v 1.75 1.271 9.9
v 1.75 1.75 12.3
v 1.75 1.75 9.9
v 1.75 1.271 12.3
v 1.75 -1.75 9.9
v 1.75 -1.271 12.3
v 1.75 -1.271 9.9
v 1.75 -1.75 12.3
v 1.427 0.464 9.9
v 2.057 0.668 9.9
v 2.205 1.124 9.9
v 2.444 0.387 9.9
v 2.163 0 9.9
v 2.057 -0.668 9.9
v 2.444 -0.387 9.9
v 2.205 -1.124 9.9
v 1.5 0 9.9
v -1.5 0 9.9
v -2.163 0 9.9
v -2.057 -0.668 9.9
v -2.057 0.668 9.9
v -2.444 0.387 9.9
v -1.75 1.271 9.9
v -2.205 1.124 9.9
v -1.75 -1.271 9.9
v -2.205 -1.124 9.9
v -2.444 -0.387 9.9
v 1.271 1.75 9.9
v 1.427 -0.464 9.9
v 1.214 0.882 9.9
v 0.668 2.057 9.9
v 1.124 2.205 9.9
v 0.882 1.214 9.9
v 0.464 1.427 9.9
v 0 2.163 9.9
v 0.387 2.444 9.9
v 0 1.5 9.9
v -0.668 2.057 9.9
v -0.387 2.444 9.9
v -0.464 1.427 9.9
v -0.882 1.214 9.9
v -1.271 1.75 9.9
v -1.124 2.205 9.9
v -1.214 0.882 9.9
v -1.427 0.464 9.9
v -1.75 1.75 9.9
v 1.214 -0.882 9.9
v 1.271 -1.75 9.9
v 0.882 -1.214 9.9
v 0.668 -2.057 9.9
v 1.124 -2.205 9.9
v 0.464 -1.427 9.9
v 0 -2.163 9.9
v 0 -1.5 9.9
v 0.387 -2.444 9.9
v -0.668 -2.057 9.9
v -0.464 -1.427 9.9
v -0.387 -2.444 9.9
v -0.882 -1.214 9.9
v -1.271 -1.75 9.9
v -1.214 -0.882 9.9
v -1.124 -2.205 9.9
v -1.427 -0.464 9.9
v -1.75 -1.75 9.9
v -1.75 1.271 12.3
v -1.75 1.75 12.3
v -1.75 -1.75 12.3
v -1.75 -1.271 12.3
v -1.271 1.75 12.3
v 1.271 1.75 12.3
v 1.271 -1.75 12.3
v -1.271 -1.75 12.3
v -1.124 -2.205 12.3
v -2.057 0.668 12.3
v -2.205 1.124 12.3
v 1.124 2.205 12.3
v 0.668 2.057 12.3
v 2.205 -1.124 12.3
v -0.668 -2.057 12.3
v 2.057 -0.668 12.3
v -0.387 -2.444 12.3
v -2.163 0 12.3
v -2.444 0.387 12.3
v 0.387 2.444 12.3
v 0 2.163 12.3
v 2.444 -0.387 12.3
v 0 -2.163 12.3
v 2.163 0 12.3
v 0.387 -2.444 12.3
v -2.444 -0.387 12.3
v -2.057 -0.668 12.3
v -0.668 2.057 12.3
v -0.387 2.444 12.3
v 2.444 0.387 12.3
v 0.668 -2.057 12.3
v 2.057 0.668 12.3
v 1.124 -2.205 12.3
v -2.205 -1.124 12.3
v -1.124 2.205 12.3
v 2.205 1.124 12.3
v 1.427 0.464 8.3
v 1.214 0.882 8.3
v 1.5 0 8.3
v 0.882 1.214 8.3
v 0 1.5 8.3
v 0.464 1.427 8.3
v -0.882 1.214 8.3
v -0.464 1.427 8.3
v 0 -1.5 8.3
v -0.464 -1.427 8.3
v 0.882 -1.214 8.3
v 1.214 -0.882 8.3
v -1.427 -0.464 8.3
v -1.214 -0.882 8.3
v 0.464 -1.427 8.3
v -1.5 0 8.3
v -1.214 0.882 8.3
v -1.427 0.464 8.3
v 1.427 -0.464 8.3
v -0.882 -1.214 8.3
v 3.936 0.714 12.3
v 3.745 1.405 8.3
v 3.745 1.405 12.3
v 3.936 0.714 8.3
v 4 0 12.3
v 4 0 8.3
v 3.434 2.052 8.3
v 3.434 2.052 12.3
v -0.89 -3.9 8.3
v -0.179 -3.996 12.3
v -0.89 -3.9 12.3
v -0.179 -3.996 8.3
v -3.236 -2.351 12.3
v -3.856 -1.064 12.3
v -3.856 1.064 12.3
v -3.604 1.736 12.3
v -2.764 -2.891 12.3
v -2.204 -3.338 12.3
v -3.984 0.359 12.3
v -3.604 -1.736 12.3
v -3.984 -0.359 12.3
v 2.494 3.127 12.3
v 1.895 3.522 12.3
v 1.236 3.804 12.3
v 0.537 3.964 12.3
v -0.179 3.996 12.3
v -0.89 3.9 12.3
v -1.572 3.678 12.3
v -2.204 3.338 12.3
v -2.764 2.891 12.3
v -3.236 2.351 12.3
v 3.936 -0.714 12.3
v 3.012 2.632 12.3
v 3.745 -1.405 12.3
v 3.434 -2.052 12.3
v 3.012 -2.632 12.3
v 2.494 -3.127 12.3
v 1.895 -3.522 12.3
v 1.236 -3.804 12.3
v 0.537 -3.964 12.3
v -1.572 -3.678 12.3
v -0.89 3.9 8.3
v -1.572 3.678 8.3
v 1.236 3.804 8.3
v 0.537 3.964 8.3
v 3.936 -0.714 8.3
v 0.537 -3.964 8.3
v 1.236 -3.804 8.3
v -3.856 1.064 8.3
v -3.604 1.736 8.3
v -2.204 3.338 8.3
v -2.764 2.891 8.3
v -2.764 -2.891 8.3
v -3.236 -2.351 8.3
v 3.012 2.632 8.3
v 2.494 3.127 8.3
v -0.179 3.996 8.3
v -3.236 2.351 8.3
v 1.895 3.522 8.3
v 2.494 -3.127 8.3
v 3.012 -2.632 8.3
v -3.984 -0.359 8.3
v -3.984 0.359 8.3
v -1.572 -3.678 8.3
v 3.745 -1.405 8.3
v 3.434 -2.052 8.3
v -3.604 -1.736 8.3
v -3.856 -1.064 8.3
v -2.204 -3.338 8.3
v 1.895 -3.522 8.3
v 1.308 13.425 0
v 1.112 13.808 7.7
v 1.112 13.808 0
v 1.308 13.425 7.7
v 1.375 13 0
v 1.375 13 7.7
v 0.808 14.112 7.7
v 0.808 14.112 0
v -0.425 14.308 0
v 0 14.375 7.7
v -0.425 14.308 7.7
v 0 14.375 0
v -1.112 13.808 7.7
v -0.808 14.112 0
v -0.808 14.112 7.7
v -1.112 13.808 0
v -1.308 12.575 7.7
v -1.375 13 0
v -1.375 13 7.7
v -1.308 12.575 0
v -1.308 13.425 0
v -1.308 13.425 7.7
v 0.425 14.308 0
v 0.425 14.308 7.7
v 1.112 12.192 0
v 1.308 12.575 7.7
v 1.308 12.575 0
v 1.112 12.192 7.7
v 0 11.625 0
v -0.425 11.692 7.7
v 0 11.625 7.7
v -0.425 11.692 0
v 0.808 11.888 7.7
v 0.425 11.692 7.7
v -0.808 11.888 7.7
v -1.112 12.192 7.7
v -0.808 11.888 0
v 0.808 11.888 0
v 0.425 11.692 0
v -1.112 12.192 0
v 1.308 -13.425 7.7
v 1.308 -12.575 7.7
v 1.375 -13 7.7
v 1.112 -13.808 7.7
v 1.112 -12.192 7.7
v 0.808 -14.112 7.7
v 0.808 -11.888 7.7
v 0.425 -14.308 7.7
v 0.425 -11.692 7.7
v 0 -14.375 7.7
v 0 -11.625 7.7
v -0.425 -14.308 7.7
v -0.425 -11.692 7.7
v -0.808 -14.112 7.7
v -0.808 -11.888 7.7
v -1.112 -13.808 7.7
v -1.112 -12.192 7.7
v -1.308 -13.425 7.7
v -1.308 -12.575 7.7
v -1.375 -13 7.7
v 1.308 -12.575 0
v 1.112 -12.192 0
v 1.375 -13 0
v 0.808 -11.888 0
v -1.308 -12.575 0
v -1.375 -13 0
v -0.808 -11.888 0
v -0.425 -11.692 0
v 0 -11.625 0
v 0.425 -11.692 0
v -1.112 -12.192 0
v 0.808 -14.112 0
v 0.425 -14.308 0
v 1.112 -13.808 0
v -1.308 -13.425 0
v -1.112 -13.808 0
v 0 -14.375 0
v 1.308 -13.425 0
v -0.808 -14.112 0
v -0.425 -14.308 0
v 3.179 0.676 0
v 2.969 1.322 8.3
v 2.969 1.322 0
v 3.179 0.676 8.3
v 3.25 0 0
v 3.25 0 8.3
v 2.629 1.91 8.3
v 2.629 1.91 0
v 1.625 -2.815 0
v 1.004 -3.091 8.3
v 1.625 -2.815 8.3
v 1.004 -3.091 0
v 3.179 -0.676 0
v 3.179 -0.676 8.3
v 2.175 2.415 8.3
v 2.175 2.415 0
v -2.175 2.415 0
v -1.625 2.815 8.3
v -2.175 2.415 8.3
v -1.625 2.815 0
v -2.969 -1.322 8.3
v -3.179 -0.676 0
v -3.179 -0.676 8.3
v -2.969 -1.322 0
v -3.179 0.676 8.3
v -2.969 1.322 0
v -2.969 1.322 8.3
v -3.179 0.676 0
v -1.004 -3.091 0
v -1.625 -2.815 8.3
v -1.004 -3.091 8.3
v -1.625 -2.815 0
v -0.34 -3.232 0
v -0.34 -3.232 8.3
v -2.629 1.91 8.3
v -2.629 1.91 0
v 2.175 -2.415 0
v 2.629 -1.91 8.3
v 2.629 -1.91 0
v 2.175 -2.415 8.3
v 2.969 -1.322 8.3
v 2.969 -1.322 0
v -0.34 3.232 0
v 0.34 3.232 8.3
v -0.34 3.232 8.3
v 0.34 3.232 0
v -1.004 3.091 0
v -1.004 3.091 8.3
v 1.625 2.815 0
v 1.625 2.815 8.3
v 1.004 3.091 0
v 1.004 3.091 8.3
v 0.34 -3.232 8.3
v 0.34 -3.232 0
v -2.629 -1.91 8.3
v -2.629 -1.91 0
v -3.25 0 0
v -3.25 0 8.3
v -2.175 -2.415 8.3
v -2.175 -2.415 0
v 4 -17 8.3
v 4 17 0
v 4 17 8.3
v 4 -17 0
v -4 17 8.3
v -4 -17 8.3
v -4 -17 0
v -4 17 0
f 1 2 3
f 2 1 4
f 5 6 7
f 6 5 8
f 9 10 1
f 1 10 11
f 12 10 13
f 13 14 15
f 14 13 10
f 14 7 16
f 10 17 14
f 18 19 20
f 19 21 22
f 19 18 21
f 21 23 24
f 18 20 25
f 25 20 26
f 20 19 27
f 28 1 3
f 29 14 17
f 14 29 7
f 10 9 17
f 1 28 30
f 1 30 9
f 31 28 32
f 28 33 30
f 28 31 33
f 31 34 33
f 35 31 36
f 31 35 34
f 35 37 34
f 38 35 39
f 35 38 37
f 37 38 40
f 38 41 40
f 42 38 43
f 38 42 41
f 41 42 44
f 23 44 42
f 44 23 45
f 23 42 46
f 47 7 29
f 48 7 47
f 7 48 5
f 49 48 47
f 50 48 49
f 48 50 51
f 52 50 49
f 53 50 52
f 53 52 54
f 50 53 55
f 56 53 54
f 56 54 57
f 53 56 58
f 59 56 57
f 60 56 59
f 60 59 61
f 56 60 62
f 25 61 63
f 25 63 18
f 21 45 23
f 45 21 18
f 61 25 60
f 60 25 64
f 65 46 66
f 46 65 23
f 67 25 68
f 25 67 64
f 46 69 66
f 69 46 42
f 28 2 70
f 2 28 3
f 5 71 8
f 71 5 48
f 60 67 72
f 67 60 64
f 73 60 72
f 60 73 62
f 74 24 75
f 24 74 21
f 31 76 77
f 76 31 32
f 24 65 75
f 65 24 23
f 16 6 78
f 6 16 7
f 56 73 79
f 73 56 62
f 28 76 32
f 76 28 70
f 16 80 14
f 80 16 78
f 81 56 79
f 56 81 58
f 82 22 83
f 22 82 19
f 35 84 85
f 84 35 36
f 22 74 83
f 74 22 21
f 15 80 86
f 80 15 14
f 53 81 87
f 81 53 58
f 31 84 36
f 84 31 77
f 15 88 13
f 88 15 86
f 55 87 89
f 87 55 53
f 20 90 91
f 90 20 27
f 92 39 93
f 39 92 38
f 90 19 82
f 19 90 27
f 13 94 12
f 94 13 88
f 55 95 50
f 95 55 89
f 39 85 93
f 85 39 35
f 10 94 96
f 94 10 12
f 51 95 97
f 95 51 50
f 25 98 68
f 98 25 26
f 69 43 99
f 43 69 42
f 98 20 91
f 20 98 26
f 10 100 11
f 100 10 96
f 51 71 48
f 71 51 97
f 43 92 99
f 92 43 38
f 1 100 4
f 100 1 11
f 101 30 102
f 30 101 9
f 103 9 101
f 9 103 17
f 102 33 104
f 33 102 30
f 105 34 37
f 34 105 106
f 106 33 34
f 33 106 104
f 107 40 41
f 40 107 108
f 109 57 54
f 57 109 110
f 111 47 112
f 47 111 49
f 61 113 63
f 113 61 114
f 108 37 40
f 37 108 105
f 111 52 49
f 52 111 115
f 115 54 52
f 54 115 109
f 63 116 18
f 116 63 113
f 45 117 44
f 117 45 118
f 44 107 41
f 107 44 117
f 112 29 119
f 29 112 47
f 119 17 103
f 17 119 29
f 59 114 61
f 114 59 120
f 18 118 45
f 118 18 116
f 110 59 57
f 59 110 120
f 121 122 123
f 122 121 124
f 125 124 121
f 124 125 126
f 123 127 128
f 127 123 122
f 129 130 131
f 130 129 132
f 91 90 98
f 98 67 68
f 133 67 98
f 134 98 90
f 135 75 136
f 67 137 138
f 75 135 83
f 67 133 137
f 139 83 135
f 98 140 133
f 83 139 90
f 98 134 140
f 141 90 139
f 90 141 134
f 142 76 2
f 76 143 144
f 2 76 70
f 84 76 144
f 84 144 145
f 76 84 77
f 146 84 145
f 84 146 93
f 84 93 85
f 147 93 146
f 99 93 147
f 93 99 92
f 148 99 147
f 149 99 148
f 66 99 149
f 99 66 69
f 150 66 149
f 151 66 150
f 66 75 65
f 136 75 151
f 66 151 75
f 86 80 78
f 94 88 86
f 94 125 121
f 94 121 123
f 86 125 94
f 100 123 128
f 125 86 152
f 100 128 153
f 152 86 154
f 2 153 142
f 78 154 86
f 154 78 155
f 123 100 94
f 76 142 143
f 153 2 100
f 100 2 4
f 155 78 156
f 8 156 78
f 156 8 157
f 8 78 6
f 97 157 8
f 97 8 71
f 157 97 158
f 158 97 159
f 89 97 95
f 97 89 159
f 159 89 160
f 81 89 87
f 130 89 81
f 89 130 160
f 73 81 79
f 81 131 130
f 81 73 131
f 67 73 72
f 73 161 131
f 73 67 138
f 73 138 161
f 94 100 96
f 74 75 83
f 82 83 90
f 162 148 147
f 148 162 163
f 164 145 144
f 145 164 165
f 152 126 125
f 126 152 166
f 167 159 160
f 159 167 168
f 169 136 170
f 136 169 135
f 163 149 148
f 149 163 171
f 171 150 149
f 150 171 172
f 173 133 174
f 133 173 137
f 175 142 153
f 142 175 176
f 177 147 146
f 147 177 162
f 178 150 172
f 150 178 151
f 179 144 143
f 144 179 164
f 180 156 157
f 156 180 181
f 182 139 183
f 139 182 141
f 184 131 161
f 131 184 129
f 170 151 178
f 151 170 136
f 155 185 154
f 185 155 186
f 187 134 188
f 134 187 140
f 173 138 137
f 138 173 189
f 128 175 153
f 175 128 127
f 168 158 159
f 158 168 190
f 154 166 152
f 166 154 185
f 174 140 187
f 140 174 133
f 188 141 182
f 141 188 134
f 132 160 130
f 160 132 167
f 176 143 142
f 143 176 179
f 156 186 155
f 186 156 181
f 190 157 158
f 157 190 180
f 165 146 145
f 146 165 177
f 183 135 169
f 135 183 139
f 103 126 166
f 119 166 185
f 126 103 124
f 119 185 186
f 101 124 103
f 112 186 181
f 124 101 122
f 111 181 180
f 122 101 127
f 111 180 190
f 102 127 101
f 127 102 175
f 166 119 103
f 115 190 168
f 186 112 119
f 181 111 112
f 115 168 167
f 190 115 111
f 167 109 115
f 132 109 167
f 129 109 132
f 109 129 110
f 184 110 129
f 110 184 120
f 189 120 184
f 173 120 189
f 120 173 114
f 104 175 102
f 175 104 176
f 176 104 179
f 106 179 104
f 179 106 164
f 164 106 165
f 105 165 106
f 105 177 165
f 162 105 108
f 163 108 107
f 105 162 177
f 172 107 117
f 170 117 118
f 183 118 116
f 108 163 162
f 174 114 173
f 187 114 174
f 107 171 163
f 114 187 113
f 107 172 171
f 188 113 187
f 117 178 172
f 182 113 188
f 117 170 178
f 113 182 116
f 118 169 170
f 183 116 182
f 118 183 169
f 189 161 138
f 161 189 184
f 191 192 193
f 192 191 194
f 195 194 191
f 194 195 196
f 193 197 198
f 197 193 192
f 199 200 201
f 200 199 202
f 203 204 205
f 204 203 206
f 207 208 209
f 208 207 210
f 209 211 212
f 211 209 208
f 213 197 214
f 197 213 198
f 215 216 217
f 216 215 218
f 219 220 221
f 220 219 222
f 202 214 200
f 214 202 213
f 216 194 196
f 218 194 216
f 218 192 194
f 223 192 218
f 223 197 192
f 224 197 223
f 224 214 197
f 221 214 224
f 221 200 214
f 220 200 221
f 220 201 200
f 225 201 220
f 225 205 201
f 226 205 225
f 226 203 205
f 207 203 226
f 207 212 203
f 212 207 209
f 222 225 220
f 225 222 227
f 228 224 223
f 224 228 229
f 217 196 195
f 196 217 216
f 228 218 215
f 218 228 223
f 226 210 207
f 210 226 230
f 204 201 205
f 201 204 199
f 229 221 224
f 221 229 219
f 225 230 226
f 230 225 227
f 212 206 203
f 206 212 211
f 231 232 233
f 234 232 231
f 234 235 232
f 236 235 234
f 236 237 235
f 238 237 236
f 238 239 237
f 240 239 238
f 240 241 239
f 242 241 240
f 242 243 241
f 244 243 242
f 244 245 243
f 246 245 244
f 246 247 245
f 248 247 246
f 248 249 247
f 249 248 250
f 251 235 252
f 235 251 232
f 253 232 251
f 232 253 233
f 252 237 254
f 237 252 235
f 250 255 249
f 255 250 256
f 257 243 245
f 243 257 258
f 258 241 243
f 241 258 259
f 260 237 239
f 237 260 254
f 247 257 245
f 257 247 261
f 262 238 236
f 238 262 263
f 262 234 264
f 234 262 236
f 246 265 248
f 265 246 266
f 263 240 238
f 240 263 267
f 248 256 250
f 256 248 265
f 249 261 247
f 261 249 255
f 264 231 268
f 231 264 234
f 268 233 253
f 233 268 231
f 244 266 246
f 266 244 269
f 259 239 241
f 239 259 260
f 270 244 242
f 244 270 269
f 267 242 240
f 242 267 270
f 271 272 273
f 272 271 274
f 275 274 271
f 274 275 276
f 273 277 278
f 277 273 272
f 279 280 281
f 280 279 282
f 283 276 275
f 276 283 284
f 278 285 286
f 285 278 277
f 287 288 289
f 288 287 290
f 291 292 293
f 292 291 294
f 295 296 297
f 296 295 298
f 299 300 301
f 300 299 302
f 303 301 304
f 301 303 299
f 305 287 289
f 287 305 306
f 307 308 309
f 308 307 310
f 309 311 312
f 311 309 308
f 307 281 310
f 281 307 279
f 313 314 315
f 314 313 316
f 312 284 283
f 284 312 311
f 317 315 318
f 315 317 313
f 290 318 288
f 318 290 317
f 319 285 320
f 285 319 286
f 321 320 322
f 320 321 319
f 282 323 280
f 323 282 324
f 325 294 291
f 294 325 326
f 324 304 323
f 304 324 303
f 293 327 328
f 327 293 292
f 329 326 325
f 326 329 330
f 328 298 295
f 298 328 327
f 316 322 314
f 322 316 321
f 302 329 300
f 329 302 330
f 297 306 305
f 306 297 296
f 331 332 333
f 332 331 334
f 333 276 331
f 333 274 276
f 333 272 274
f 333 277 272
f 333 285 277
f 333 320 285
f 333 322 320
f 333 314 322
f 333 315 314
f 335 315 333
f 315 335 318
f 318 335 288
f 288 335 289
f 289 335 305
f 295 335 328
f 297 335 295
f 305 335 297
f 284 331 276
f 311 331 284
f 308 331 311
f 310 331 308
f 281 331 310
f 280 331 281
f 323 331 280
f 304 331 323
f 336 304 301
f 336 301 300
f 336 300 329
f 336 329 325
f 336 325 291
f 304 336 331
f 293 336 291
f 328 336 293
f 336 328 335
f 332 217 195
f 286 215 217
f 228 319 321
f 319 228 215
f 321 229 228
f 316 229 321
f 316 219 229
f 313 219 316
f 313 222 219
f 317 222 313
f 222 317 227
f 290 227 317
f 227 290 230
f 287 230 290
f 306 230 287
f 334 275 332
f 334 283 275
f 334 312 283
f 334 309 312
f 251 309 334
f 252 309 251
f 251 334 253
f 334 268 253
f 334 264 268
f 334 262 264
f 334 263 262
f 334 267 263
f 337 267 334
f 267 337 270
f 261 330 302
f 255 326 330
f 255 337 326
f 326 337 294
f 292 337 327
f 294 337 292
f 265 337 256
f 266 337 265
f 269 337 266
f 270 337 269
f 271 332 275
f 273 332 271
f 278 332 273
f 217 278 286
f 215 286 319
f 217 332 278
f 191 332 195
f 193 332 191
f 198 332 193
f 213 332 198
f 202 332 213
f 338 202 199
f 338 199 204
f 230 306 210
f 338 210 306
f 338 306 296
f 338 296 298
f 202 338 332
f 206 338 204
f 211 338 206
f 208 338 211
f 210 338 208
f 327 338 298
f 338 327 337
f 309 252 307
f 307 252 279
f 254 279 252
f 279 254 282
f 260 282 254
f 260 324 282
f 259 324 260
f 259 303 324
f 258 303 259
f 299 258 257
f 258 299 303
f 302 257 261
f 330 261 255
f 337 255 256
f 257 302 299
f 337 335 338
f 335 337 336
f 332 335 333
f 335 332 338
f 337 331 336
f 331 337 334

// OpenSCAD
// file: lib/lidar.scad
module lidarServoHolder() {
    length = 23.5;
    breadth = 12.7;
    height = 16;
    tabThickness = 4.5;
    screwHoleDistance = 28;
    screwDiameter = 2.4;
    screwHeight = 10;
    wallThickness = 1;
    totalLength = length+2*tabThickness;
    totalBreath = breadth+2*wallThickness;
    connectorWidth = 4;

    translate([-totalLength/2, 0, 0]) {
        difference() {
            translate([0, -totalBreath/2, 0]) {
                cube([totalLength, totalBreath, height+2*plateThickness]);
            }
            union() {
                translate([tabThickness, -totalBreath/2+wallThickness,
                           plateThickness+iota]) {
                    cube([length, breadth, height+plateThickness]);
                }
                for (dx = [-screwHoleDistance/2, screwHoleDistance/2]) {
                    translate([totalLength/2+dx, 0,
                               height+2*plateThickness-screwHeight+iota]) {
                        cylinder(d = screwDiameter, h = screwHeight, $fn=20);
                    }
                }
                translate([-iota, 0, plateThickness+iota]) {
                    scale([1, 1.5, 1]) {
                        difference() {
                            rotate([0, 90, 0]) {
                                cylinder(d = 2*connectorWidth,
                                         h = tabThickness+2*iota, $fn=40);
                            }
                            translate([-iota, -connectorWidth, -connectorWidth]) {
                                cube([tabThickness+4*iota,
                                      2*connectorWidth, connectorWidth]);
                            }
                        }
                    }
                }
            }
        }
    }
}

hornDiameter = 8;
hornHeight = 4;
hornHoleDepth = 2.5;
hornHoleSquareWidth = 3.5;
hornScrewDiameter = 3;
hornScrewHeadDiameter = 6.5;
headMountScrewOffset = 6.4;
connectorWidth = 18;
connectorHeight = 2.6;
screwHeadThickness = 1.5;
headLength = connectorWidth + 2*hornDiameter;
headHeight = screwLength - screwHeadThickness + 0.5;
headEdgeOffset = (headLength - 2*headMountScrewOffset)/2;
headMountScrewDiameter = 2;
headHoleOffset = headLength/2 - hornDiameter/2;


// screwLength = 9.3;
// screwHoleDiameter = 2.75;
// screwBodyDiameter = 3.4;


module servoAdd() {
    cylinder(d=hornDiameter, h=hornHeight, $fn=35);
}

module servoDel() {
    union() {
        translate([0, 0, -iota]) {
            cylinder(d=hornScrewDiameter, h=hornHeight+2*iota, $fn=20);
        }
        for (r = [0 : 90.0/5 : 90]) {
            rotate([0, 0, r]) {
                translate([-hornHoleSquareWidth/2, -hornHoleSquareWidth/2,
                        hornHeight-hornHoleDepth+iota]) {
                    cube([hornHoleSquareWidth, hornHoleSquareWidth, hornHoleDepth]);
                }
            }
        }
    }
}

module lidarHeadPart1() {
    translate([0, 0, headHeight]) {
        difference() {
            servoAdd();
            servoDel();
        }
    }
    difference() {
        translate([-hornDiameter/2, -headLength/2, 0]) {
            cube([hornDiameter, headLength, headHeight]);
        }
        union() {
            translate([0, 0, -iota]) {
                cylinder(d = hornScrewHeadDiameter,
                    h = headHeight+2*iota, $fn = 30);
            }
            for (o = [headHoleOffset, -headHoleOffset]) {
                translate([0, o, -iota]) {
                    cylinder(d = screwHoleDiameter,
                        h = screwLength - screwHeadThickness, $fn=20);
                }
            }
        }
    }
}

module lidarHeadPart2() {
    difference() {
        translate([-hornDiameter/2, -headLength/2, 0]) {
            cube([hornDiameter, headLength, 2*connectorHeight]);
        }
        union() {
            translate([-hornDiameter/2-iota,
                      -connectorWidth/2, connectorHeight+iota]) {
                cube([hornDiameter+2*iota, connectorWidth, connectorHeight]);
            }
            for (o = [headHoleOffset, -headHoleOffset]) {
                translate([0, o, -iota]) {
                    cylinder(d = screwBodyDiameter,
                             h = 2*connectorHeight+2*iota, $fn=20);
                    cylinder(d = screwHeadDiameter,
                             h = 2*connectorHeight-screwHeadThickness, $fn=20);
                }
            }
        }
    }
}
// file: lib/stepper.scad
smWidth = 42;
smLength = 40;
smScrewHoleOffsets = 31/2;
smCenterDiameter = 22;
smExtra = 1;

module stepperMotor() {
    smCenterHeight = 2;
    smShaftDiameter = 5;
    smShaftLength = 23;
    smScrewDepth = 4.5;
    smScrewDiameter = 3;
    smEdgeTrimOffset = 27;
    module add() {
        translate([-smWidth/2, -smLength, -smWidth/2]) {
            cube([smWidth, smLength, smWidth]);
        }
        rotate([-90, 0, 0]) {
            cylinder(d=smCenterDiameter, h=smCenterHeight, $fn=30);
            cylinder(d=smShaftDiameter, h=smShaftLength, $fn=20);
        }
    }
    module del() {
        for (x = [smScrewHoleOffsets, -smScrewHoleOffsets]) {
            for (z = [smScrewHoleOffsets, -smScrewHoleOffsets]) {
                translate([x, iota, z]) {
                    rotate([90, 0, 0]) {
                        cylinder(d=smScrewDiameter, h=smScrewDepth, $fn=40);
                    }
                }
            }
        }
        for (a = [45, 135, 225, 315]) {
            rotate([0, a, 0]) {
                translate([smEdgeTrimOffset,
                        -smLength-iota, -smWidth/2-iota]) {
                    cube([smWidth, smLength+2*iota, smWidth+2*iota]);
                }
            }
        }

    }
    difference() {
        add();
        del();
    }
}

module stepperMotorHole() {
    smHoleHeight = 20;
    smScrewHoleDiameter = 4;

    widthPlusExtra = smWidth + smExtra;
    lengthPlusExtra = smLength + smExtra/2;

    translate([-smWidth/2, -lengthPlusExtra, -widthPlusExtra/2]) {
        cube([smWidth, lengthPlusExtra, widthPlusExtra]);
    }
    translate([0, -iota, 0]) {
        rotate([-90, 0, 0]) {
            cylinder(d=smCenterDiameter+smExtra, h=smHoleHeight, $fn=40);
        }
    }
    for (x = [smScrewHoleOffsets, -smScrewHoleOffsets]) {
        for (z = [smScrewHoleOffsets, -smScrewHoleOffsets]) {
            translate([x, smHoleHeight-iota, z]) {
                rotate([90, 0, 0]) {
                    cylinder(d=smScrewHoleDiameter, h=smHoleHeight, $fn=40);
                }
            }
        }
    }

}
// file: lib/commonConstants.scad
// A small quantity to keep parts from starting or ending at exactly the
// same location. For example when we create a hole through an object we
// want the object being subtracted to stick slightly past the object being
// subtracted from.
iota = 0.1;


// Length and hole diameter of the #4 x 3/8in Phillips mount screw.
screwLength = 9.3;
screwHoleDiameter = 2.75;
screwHeadDiameter = 6.5;
screwBodyDiameter = 3.4;


// These constants are the basic parameters of the mount plate. They are
// necessary for other components to make their calculations.
mountPlateWidth = 37.6;
mountPlateLength = 51;


// These constants are the basis for the carbon fiber mount points. They are
// necessary for other components to make their calculations.
mountRodDiameter = 5.5;         // A little extra because holes are smaller.
mountThickness = 9;
mountDiameter = mountRodDiameter + 2*mountThickness;


// These constasnts are teh basis for the motor base. They are necessary for
// other components to make their calculations.
motorBaseExtraAxisOffset = 5;
motorBaseTopOffset = sqrt(3)*mountPlateWidth/6 + motorBaseExtraAxisOffset;
motorBaseBottomOffset = mountPlateLength/sqrt(2) + motorBaseTopOffset;
motorBaseBottomRadius = sqrt(pow(motorBaseBottomOffset,2) +
                             pow(mountPlateWidth/2, 2));
mountBaseRodOffsets = motorBaseBottomRadius-mountDiameter/2;
// main file
include <lib/commonConstants.scad>;
include <lib/stepper.scad>;
include <lib/commonMounts.scad>;
include <lib/lidar.scad>;

lidarHeadPart1();
